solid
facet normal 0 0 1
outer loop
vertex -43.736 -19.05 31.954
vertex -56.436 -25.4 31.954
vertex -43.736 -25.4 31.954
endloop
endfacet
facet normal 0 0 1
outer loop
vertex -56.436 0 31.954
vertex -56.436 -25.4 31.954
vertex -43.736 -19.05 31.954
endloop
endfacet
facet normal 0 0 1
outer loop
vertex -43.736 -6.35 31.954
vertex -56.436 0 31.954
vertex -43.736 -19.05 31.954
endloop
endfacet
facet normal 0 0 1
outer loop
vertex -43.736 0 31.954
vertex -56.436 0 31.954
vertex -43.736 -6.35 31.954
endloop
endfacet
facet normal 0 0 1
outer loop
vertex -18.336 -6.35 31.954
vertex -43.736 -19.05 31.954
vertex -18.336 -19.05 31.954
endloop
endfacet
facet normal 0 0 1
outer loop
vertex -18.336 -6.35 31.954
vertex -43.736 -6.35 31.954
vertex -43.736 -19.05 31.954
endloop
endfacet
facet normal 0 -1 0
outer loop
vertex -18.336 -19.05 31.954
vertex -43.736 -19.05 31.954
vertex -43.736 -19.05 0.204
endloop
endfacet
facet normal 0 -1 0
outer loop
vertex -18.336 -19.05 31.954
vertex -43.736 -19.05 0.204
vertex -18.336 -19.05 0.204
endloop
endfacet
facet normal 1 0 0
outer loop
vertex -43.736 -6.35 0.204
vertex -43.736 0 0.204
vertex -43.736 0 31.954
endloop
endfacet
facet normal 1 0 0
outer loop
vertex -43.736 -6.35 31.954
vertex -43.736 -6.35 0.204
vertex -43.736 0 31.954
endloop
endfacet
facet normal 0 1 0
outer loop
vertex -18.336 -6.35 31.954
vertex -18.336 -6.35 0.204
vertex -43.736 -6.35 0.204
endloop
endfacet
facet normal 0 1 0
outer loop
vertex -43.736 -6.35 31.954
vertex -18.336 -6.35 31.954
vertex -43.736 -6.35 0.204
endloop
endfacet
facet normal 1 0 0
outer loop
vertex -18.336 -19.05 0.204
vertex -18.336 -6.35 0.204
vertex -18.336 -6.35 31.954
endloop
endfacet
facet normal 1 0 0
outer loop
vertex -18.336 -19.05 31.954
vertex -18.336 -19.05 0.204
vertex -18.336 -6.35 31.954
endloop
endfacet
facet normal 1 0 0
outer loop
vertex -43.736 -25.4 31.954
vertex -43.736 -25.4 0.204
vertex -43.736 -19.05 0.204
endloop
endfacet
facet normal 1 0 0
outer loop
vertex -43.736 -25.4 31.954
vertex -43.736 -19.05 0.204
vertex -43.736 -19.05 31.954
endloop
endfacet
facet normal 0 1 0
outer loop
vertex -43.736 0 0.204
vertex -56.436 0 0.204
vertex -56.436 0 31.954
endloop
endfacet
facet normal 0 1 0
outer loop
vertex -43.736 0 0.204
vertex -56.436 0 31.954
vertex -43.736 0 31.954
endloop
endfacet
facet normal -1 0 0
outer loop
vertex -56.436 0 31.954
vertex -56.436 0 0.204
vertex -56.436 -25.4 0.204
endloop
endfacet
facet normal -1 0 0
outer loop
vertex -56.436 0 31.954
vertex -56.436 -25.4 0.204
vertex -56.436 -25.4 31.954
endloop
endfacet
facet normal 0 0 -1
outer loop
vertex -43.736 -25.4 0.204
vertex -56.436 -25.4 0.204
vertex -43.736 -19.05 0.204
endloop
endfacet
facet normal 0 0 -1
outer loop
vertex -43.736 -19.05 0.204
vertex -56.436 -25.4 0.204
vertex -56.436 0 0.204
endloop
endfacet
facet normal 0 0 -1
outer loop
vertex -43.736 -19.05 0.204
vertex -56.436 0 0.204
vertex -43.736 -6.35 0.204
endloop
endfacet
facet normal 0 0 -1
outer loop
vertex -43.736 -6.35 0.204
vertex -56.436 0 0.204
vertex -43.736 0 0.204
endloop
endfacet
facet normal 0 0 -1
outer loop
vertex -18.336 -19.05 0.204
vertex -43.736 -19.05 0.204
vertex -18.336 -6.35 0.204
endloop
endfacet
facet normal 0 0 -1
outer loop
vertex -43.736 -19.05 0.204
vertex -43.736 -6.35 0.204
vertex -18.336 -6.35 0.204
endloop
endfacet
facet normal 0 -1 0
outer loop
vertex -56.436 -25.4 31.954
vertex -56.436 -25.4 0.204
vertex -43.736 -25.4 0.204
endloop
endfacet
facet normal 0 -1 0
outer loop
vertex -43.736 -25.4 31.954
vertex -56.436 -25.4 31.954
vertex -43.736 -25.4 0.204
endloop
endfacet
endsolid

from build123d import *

# Parameters (mm, degrees)
F0_W     = 38.1
F0_H     = 31.75
F1_DEPTH = 25.4
F2_W     = 25.4
F2_H     = 31.75
F3_DEPTH = 6.35
F4_W     = 25.4
F4_H     = 31.75
F5_DEPTH = 6.35


# Not quite as in the source:
# - a feature names something its author has since deleted; it is built from what else it names


with BuildPart() as f1:
    # F0 (on Front) → F1 (new body)
    with BuildSketch(Plane.XZ):
        with Locations((-37.3860847076, 16.0793865216)):
            Rectangle(F0_W, F0_H)
    extrude(amount=F1_DEPTH)

    # F2 (on face) → F3 (cut)
    with BuildSketch(Plane.XZ.offset(25.4)):
        with Locations((-31.0360847076, 16.0793865216)):
            Rectangle(F2_W, F2_H)
    extrude(amount=-F3_DEPTH, mode=Mode.SUBTRACT)

    # F4 (on face) → F5 (cut)
    with BuildSketch(Plane(origin=(0, 0, 0), x_dir=(-1, 0, 0), z_dir=(0, 1, 0))):
        with Locations((31.0360847076, 16.0793865216)):
            Rectangle(F4_W, F4_H)
    extrude(amount=-F5_DEPTH, mode=Mode.SUBTRACT)


solid = f1.part
